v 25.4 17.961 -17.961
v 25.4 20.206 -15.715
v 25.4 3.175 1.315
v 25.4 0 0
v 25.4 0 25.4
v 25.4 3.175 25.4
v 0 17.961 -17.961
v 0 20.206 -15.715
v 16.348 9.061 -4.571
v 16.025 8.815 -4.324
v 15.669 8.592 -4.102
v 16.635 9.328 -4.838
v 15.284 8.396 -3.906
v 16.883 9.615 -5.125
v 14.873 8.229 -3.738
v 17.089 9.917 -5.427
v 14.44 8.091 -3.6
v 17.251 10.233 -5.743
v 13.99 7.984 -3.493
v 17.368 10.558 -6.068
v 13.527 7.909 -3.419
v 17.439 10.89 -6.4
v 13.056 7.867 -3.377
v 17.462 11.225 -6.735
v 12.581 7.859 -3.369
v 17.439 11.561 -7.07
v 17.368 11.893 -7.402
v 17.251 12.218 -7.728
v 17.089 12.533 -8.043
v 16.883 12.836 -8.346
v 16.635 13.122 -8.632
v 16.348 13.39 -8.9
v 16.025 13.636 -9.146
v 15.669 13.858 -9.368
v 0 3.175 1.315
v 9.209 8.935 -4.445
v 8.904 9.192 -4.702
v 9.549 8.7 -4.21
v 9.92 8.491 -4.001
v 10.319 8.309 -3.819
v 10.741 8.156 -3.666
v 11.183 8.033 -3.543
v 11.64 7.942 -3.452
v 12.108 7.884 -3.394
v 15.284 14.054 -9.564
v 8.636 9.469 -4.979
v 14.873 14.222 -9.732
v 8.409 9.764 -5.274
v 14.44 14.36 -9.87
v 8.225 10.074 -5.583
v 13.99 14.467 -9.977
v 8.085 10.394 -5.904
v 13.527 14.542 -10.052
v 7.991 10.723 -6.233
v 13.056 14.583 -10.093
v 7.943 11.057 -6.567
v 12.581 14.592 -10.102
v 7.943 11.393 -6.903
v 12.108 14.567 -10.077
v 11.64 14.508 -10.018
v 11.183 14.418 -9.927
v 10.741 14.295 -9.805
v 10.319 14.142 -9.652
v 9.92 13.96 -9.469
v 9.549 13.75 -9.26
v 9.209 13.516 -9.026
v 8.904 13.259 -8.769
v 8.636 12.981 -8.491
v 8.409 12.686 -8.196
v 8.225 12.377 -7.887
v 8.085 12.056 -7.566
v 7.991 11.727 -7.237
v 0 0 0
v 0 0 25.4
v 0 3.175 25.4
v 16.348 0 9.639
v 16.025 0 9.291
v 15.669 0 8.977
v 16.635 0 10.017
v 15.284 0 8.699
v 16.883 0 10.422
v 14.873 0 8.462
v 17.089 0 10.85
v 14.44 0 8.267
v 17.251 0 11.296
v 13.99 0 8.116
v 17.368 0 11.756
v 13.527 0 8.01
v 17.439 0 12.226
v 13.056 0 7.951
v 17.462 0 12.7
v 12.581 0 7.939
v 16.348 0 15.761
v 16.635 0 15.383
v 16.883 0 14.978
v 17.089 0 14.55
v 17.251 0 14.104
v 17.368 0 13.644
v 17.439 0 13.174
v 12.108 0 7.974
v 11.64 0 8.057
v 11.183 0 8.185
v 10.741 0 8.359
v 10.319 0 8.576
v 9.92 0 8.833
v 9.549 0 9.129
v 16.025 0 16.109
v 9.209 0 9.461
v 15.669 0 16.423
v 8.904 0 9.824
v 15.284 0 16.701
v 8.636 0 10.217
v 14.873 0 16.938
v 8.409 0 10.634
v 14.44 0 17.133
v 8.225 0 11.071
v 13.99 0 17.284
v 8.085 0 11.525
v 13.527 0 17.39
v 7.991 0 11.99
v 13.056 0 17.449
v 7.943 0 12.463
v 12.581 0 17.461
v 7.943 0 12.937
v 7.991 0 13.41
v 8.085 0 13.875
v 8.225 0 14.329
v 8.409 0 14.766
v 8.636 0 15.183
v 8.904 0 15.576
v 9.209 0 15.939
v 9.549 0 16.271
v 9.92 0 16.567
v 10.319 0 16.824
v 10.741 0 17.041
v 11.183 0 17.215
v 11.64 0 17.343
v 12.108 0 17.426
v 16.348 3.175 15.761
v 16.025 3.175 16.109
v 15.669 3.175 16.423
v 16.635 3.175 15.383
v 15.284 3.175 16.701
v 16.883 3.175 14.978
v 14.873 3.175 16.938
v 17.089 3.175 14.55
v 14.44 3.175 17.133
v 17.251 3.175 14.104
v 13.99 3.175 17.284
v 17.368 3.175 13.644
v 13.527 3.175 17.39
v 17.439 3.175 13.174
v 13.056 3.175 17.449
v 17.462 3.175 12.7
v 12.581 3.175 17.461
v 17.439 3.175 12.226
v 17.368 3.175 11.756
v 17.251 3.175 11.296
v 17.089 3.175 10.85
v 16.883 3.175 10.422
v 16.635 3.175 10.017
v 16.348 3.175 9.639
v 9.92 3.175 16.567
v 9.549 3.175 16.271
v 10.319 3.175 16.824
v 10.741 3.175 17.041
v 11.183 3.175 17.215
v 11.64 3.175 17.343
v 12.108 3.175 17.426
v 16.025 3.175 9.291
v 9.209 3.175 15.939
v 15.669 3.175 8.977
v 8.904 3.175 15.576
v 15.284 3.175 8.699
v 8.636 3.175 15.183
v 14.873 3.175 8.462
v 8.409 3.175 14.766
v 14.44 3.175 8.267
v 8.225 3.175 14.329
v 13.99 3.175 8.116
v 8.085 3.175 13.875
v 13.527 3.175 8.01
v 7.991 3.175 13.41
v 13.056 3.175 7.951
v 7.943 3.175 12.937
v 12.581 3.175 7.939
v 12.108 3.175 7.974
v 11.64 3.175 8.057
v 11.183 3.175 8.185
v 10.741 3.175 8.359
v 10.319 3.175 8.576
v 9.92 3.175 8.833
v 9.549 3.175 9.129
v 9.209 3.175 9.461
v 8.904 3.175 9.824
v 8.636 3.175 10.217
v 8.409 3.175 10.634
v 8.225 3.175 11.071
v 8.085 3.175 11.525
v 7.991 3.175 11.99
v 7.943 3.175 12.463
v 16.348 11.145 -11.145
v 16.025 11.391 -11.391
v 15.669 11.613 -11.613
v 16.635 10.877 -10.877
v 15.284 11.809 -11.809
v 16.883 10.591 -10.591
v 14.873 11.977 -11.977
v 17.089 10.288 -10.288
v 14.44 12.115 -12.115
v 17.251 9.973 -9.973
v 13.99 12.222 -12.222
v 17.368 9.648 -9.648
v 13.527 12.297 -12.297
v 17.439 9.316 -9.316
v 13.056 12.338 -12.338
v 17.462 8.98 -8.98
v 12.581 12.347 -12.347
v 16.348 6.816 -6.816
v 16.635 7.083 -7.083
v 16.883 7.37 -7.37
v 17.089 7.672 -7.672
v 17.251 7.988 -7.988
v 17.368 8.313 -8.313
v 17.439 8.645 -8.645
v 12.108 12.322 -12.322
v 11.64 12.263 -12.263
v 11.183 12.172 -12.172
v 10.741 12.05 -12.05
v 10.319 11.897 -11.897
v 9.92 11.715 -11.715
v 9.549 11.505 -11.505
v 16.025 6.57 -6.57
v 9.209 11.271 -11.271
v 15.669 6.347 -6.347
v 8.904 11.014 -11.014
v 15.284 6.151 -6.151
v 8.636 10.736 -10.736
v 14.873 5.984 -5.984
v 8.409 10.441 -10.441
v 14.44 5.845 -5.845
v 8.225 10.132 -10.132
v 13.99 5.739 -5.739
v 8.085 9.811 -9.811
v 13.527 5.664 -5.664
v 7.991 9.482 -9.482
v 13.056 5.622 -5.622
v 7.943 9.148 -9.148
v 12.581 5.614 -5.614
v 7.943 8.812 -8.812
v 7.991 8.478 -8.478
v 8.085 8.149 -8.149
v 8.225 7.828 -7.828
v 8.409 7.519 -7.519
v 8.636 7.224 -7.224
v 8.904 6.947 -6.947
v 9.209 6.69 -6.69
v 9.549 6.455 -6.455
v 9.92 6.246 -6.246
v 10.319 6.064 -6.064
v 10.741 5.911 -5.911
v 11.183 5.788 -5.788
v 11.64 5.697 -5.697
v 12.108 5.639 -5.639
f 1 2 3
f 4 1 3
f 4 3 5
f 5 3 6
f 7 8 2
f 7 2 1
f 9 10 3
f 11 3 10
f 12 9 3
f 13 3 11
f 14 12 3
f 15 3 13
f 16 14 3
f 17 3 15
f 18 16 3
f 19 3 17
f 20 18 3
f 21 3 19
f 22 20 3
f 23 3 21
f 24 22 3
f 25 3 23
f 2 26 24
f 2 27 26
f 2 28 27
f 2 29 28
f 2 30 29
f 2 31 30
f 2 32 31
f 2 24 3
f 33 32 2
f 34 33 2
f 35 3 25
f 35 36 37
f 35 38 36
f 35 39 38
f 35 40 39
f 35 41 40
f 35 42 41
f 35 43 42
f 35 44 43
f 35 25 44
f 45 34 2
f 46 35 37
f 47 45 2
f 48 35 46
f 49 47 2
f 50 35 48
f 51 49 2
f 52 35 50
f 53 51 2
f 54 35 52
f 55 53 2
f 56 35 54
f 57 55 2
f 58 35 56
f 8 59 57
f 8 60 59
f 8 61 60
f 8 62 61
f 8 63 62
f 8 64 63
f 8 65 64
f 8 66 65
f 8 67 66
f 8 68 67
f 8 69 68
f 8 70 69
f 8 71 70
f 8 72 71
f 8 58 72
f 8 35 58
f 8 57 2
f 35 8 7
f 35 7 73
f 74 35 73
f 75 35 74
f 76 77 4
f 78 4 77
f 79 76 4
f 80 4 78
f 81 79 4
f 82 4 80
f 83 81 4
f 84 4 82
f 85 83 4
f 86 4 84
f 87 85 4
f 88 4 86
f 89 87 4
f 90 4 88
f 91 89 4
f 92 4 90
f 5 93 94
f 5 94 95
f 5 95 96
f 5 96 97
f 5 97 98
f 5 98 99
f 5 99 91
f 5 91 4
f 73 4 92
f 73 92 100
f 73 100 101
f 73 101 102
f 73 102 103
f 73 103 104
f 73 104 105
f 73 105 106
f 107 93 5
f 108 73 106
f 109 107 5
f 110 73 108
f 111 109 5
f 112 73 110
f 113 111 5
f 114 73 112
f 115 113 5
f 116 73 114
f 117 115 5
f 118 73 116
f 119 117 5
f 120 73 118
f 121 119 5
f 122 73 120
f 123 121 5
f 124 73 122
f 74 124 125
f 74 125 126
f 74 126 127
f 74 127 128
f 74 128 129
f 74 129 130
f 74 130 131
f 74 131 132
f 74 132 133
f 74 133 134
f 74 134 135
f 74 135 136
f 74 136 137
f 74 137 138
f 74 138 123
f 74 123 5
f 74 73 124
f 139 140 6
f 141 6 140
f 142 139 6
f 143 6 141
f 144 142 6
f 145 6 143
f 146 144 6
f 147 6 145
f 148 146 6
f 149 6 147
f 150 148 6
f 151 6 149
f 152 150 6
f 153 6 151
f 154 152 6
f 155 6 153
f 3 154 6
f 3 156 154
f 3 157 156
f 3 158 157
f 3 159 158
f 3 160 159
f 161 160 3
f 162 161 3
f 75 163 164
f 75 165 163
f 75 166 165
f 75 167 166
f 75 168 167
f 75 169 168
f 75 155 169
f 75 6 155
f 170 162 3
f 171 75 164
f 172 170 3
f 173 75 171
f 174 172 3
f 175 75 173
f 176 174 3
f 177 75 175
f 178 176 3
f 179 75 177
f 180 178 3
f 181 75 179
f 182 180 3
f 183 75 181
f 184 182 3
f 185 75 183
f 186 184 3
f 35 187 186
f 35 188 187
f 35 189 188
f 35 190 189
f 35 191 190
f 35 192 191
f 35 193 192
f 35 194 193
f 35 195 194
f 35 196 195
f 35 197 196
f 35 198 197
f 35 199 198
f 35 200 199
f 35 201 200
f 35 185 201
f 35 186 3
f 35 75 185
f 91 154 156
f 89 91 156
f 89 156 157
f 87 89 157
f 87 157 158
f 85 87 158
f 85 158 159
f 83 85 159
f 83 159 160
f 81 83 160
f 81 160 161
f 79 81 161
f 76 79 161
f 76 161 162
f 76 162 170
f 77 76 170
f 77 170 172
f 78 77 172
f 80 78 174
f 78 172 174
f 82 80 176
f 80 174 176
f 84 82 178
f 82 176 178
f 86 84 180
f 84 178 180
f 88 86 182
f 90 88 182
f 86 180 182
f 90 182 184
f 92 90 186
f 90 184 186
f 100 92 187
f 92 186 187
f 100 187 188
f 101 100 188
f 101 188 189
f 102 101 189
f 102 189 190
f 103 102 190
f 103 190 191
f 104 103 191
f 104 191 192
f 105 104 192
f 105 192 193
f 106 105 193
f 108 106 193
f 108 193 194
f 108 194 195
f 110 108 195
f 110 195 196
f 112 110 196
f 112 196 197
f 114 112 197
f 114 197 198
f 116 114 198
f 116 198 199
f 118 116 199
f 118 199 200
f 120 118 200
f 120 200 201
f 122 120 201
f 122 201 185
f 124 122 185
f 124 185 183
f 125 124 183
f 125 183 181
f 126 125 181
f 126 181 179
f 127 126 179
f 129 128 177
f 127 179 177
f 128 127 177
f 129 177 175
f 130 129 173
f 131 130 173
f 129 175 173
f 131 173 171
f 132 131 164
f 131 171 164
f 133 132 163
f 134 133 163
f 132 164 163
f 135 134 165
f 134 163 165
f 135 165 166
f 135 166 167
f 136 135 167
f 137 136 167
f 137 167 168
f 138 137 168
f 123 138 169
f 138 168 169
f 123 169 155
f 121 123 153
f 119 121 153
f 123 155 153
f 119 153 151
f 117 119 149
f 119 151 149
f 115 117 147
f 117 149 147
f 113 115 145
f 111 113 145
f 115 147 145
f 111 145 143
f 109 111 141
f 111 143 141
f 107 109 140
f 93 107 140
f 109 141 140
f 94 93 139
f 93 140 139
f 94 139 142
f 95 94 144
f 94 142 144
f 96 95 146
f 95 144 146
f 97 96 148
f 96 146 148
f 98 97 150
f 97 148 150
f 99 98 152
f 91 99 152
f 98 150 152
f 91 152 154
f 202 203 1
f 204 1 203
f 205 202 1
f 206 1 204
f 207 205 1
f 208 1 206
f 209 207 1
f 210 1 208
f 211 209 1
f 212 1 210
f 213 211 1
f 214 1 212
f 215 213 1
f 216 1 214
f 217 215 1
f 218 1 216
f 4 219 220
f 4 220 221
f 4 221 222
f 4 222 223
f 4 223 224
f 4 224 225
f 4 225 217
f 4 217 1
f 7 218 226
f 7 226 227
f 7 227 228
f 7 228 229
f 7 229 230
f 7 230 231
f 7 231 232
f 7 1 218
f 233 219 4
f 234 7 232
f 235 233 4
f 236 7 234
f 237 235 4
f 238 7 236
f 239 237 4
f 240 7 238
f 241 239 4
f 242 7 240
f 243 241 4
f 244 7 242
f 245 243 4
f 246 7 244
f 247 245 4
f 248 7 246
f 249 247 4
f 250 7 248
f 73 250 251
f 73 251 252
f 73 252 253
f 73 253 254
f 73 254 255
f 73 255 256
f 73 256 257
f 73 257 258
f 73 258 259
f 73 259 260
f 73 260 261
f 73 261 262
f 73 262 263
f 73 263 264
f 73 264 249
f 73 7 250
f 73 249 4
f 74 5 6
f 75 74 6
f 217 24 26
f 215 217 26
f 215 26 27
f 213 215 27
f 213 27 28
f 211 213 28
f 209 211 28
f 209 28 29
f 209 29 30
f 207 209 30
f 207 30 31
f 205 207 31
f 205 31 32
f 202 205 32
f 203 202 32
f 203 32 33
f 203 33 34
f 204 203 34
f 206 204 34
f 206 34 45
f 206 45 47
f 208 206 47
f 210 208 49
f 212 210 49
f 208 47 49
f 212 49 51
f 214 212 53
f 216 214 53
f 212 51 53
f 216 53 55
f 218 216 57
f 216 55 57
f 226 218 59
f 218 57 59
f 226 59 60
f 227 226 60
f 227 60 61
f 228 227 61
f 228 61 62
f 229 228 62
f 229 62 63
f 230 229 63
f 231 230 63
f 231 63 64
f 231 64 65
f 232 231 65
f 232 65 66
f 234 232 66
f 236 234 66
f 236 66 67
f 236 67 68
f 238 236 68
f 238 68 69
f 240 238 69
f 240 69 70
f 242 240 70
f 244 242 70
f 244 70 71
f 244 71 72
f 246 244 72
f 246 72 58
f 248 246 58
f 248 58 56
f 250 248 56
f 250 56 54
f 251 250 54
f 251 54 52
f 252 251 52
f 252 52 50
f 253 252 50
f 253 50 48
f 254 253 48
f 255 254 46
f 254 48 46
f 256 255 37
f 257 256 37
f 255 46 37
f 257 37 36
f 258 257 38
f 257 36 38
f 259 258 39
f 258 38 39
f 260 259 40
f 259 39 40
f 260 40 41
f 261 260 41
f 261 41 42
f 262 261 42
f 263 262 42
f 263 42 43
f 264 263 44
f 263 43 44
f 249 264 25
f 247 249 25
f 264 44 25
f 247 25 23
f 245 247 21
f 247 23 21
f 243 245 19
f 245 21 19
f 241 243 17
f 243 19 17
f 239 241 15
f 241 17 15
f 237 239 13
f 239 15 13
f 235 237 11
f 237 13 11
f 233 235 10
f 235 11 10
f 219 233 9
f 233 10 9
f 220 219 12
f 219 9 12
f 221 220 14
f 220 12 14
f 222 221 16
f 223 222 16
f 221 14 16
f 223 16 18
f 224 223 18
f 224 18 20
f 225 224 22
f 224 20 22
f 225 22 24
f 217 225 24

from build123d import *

# Parameters (mm, degrees)
BOSS_EXTRUDE1_DEPTH = 25.4
SKETCH2_R           = 4.7625
CUT_EXTRUDE1_DEPTH  = 25.4
SKETCH3_R           = 4.7625
CUT_EXTRUDE2_DEPTH  = 16.875


with BuildPart() as part:
    # Sketch1 → Boss-Extrude1 (new body)
    with BuildSketch(Plane(origin=(0, 0, 0), x_dir=(0, 0, -1), z_dir=(1, 0, 0))):
        Polygon((0, 0), (-25.4, 0), (-25.4, 3.175), (-1.315128061, 3.175), (15.715448212, 20.205576272), (17.960512242, 17.960512242), align=None)
    extrude(amount=BOSS_EXTRUDE1_DEPTH)

    # Sketch2 → Cut-Extrude1 (cut)
    with BuildSketch(Plane(origin=(0, 3.175, 0), x_dir=(1, 0, 0), z_dir=(0, 1, 0))):
        with Locations((12.7, -12.7)):
            Circle(SKETCH2_R)
    extrude(amount=-CUT_EXTRUDE1_DEPTH, mode=Mode.SUBTRACT)

    # Sketch3 → Cut-Extrude2 (cut, through all)
    with BuildSketch(Plane(origin=(0, 2.24506403, 2.24506403), x_dir=(1, 0, 0), z_dir=(0, 0.707106781, 0.707106781))):
        with Locations((12.7, 12.7)):
            Circle(SKETCH3_R)
    extrude(amount=-CUT_EXTRUDE2_DEPTH, mode=Mode.SUBTRACT)


solid = part.part
